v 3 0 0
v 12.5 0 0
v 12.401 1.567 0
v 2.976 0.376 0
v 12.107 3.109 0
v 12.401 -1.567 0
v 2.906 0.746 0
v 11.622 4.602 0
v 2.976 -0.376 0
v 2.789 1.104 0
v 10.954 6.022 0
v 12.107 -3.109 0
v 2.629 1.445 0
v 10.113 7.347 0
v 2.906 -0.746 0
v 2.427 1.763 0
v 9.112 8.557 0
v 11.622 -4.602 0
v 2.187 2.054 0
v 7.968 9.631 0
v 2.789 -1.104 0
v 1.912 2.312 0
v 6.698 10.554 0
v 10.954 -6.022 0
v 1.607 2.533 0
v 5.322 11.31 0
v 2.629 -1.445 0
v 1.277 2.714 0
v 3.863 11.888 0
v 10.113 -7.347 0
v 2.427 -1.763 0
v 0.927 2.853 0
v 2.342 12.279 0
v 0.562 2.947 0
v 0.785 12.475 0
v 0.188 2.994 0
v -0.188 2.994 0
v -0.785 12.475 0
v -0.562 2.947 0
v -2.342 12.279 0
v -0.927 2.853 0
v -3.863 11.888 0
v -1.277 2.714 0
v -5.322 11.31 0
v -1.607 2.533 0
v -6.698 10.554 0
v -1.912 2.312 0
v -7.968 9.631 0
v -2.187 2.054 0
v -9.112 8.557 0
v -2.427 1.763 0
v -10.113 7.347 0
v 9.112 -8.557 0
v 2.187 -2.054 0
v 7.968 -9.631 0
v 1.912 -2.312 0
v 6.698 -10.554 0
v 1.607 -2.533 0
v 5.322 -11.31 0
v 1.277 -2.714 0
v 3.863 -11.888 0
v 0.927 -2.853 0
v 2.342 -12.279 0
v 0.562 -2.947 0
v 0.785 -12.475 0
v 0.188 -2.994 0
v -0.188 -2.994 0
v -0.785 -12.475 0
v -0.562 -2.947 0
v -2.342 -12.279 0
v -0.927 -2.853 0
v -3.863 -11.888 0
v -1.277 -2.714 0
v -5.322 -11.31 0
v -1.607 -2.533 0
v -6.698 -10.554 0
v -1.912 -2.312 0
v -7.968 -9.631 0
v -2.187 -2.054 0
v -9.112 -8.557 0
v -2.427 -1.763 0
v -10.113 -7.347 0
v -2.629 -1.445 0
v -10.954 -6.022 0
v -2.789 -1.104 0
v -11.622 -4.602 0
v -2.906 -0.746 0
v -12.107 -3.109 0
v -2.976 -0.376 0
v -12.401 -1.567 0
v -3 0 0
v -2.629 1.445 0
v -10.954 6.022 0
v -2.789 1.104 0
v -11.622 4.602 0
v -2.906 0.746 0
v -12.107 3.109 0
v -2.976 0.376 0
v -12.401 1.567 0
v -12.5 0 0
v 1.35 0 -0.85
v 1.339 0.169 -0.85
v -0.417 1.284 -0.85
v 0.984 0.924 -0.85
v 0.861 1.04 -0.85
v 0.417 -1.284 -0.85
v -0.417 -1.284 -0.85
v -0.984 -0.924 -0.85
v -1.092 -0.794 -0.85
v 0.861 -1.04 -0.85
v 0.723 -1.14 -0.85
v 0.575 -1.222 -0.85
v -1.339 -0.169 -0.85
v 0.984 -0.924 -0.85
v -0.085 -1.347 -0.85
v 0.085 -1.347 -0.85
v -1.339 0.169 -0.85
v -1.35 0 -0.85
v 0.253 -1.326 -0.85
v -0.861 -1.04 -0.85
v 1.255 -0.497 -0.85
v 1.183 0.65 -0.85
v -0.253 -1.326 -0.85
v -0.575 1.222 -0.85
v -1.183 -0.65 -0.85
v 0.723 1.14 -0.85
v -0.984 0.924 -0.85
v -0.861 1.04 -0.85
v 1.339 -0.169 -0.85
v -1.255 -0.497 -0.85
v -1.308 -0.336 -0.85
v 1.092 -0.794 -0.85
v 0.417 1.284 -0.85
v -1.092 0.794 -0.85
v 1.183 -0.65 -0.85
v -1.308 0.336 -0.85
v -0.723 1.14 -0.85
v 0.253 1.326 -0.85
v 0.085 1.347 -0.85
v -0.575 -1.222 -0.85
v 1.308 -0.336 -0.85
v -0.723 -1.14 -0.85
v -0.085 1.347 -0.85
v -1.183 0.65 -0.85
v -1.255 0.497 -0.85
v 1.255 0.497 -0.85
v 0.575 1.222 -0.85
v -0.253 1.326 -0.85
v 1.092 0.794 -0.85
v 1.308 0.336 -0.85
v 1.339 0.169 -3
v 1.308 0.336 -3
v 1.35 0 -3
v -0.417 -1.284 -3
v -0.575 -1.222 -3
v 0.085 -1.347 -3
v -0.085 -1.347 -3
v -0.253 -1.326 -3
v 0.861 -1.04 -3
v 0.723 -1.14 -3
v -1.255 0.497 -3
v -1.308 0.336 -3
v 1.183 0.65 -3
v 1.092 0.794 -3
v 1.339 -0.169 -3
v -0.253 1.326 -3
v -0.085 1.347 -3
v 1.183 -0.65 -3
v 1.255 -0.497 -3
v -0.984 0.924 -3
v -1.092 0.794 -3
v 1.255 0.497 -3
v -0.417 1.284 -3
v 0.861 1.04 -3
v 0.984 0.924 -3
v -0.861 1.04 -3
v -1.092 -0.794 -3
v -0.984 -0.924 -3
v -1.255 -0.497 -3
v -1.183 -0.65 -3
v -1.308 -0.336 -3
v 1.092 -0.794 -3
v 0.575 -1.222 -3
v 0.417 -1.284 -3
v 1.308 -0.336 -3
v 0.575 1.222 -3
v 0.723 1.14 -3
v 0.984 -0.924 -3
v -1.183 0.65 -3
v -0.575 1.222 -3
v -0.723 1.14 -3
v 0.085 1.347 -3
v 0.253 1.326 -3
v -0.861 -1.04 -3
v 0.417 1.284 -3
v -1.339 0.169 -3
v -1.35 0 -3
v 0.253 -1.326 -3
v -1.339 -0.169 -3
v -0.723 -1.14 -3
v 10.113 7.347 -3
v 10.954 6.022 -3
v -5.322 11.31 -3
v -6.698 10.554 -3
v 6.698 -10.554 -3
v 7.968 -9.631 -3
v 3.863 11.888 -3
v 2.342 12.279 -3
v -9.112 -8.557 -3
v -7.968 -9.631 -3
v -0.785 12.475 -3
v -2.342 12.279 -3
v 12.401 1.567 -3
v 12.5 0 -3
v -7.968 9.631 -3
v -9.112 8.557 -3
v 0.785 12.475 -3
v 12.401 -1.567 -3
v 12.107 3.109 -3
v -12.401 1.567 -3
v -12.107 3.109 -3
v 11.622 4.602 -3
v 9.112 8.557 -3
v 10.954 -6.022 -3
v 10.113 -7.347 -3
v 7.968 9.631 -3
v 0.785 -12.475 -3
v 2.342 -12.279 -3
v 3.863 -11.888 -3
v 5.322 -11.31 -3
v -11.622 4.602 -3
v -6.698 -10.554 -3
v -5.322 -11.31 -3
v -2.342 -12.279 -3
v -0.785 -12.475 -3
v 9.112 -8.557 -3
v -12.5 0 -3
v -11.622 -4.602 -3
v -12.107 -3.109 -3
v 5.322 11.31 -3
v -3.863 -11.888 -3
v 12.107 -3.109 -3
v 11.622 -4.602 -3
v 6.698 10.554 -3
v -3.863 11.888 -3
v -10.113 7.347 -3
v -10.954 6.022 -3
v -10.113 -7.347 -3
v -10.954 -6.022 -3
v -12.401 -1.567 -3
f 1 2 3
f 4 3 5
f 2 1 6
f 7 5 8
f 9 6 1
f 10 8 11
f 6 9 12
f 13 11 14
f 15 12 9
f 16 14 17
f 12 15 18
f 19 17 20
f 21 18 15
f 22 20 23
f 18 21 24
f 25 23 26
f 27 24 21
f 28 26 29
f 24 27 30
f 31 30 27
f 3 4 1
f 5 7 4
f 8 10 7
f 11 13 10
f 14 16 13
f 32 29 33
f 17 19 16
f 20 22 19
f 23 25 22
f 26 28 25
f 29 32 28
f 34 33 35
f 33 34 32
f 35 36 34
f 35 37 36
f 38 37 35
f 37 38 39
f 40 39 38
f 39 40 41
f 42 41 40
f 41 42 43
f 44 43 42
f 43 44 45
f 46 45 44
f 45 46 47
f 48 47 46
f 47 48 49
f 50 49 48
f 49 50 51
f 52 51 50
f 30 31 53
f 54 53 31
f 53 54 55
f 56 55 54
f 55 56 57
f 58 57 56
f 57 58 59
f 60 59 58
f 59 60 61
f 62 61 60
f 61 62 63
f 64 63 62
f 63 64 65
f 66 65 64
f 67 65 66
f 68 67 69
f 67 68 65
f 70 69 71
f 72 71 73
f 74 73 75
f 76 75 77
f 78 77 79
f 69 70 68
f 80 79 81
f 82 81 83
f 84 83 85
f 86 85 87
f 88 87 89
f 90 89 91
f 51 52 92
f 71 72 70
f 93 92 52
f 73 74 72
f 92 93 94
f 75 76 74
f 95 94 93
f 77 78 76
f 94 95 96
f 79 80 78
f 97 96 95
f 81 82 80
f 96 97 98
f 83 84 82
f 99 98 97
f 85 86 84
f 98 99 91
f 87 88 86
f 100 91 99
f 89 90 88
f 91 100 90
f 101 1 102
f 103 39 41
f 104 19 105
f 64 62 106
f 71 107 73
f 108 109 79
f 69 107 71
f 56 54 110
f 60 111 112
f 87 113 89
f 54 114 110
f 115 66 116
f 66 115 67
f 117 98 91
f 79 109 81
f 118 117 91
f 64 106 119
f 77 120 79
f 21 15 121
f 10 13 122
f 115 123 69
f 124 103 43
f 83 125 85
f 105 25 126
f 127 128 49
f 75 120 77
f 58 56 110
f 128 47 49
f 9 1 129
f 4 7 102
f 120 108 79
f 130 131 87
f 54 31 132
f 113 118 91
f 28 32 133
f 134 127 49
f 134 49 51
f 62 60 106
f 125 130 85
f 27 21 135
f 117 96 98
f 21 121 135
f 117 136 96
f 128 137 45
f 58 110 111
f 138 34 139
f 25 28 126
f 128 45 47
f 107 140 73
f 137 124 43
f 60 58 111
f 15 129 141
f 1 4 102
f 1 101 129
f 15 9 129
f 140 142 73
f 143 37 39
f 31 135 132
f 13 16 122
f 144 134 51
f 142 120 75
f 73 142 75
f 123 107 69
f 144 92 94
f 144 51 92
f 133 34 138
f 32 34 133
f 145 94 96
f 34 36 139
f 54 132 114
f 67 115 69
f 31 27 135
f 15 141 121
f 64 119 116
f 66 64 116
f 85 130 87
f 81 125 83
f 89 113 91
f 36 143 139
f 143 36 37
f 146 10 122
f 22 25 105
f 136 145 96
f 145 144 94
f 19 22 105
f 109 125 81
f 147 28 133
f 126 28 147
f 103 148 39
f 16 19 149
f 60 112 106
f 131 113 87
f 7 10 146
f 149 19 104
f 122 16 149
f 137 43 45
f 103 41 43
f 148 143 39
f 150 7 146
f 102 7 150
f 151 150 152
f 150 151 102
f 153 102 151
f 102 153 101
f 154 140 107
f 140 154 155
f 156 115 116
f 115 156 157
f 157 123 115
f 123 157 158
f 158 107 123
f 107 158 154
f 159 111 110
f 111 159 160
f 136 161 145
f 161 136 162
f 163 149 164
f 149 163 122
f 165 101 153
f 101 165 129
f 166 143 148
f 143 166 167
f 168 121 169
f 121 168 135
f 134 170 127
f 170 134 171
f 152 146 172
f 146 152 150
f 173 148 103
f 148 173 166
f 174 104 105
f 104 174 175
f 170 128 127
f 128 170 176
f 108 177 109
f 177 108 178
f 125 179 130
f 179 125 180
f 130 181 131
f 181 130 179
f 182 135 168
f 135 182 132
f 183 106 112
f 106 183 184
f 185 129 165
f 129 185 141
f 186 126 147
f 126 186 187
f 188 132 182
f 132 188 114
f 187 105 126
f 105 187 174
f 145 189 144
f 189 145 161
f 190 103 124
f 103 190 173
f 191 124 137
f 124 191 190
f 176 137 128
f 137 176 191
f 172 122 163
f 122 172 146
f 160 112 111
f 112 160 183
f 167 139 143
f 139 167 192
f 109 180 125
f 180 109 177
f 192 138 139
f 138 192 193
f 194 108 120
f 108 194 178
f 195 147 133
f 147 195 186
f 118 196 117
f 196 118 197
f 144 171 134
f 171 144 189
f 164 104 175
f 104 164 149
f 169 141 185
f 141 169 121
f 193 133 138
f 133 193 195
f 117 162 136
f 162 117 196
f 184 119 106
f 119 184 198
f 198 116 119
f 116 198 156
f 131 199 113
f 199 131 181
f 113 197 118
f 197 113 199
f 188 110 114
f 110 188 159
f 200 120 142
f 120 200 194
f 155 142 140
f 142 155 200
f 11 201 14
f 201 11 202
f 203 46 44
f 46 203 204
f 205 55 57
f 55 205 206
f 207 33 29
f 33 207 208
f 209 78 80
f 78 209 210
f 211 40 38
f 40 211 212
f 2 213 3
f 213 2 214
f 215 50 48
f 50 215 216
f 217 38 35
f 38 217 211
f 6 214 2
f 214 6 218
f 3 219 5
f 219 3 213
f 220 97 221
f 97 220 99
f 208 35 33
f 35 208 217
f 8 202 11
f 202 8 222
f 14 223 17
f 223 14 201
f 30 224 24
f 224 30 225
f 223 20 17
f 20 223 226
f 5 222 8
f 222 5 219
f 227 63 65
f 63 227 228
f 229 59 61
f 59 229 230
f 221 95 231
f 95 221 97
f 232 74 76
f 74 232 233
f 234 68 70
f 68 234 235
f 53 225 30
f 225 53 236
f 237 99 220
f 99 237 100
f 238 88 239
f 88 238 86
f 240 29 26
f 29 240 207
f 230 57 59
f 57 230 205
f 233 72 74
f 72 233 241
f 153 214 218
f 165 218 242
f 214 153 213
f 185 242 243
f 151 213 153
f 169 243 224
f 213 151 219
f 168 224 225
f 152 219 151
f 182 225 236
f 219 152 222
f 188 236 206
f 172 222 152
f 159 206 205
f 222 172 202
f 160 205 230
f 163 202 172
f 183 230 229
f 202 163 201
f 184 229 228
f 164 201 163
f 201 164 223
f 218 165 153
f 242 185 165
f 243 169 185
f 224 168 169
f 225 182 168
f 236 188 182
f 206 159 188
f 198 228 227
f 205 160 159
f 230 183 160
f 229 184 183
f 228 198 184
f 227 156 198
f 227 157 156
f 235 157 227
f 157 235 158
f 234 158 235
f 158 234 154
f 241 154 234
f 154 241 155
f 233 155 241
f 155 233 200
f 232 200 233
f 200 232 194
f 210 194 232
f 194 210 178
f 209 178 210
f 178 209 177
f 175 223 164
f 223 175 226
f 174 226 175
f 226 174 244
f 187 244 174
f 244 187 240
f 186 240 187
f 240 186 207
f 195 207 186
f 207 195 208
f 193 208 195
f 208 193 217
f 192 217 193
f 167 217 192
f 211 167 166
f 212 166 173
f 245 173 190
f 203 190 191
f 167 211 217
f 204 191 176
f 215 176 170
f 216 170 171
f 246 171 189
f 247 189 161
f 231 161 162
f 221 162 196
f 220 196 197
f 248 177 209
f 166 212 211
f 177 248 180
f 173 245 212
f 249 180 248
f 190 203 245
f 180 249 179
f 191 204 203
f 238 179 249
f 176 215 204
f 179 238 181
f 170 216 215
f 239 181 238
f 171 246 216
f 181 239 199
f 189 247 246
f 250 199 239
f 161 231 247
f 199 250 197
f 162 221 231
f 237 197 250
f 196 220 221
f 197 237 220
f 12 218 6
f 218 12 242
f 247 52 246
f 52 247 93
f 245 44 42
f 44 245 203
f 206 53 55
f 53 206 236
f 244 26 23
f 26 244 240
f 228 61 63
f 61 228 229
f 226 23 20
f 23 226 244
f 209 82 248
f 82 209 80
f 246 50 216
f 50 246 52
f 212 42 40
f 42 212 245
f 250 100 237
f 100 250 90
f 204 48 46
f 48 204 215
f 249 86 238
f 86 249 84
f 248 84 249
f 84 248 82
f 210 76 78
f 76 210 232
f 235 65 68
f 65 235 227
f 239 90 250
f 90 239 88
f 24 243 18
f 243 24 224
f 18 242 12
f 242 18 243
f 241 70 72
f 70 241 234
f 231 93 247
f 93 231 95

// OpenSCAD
$fn = 50;

difference() {
	union() {
		translate(v = [0, 0, -3.0]) {
			cylinder(h = 3, r = 12.5);
		}
	}
	union() {
		translate(v = [0, 0, 0]) {
			rotate(a = [0, 0, 0]) {
				difference() {
					union() {
						translate(v = [0, 0, -6.0]) {
							cylinder(h = 6, r = 1.0);
						}
						translate(v = [0, 0, -0.85]) {
							cylinder(h = 0.85, r1 = 1.35, r2 = 3.0);
						}
						translate(v = [0, 0, -6.0]) {
							cylinder(h = 6, r = 1.35);
						}
						translate(v = [0, 0, -6.0]) {
							cylinder(h = 6, r = 1.0);
						}
					}
					union();
				}
			}
		}
	}
}
